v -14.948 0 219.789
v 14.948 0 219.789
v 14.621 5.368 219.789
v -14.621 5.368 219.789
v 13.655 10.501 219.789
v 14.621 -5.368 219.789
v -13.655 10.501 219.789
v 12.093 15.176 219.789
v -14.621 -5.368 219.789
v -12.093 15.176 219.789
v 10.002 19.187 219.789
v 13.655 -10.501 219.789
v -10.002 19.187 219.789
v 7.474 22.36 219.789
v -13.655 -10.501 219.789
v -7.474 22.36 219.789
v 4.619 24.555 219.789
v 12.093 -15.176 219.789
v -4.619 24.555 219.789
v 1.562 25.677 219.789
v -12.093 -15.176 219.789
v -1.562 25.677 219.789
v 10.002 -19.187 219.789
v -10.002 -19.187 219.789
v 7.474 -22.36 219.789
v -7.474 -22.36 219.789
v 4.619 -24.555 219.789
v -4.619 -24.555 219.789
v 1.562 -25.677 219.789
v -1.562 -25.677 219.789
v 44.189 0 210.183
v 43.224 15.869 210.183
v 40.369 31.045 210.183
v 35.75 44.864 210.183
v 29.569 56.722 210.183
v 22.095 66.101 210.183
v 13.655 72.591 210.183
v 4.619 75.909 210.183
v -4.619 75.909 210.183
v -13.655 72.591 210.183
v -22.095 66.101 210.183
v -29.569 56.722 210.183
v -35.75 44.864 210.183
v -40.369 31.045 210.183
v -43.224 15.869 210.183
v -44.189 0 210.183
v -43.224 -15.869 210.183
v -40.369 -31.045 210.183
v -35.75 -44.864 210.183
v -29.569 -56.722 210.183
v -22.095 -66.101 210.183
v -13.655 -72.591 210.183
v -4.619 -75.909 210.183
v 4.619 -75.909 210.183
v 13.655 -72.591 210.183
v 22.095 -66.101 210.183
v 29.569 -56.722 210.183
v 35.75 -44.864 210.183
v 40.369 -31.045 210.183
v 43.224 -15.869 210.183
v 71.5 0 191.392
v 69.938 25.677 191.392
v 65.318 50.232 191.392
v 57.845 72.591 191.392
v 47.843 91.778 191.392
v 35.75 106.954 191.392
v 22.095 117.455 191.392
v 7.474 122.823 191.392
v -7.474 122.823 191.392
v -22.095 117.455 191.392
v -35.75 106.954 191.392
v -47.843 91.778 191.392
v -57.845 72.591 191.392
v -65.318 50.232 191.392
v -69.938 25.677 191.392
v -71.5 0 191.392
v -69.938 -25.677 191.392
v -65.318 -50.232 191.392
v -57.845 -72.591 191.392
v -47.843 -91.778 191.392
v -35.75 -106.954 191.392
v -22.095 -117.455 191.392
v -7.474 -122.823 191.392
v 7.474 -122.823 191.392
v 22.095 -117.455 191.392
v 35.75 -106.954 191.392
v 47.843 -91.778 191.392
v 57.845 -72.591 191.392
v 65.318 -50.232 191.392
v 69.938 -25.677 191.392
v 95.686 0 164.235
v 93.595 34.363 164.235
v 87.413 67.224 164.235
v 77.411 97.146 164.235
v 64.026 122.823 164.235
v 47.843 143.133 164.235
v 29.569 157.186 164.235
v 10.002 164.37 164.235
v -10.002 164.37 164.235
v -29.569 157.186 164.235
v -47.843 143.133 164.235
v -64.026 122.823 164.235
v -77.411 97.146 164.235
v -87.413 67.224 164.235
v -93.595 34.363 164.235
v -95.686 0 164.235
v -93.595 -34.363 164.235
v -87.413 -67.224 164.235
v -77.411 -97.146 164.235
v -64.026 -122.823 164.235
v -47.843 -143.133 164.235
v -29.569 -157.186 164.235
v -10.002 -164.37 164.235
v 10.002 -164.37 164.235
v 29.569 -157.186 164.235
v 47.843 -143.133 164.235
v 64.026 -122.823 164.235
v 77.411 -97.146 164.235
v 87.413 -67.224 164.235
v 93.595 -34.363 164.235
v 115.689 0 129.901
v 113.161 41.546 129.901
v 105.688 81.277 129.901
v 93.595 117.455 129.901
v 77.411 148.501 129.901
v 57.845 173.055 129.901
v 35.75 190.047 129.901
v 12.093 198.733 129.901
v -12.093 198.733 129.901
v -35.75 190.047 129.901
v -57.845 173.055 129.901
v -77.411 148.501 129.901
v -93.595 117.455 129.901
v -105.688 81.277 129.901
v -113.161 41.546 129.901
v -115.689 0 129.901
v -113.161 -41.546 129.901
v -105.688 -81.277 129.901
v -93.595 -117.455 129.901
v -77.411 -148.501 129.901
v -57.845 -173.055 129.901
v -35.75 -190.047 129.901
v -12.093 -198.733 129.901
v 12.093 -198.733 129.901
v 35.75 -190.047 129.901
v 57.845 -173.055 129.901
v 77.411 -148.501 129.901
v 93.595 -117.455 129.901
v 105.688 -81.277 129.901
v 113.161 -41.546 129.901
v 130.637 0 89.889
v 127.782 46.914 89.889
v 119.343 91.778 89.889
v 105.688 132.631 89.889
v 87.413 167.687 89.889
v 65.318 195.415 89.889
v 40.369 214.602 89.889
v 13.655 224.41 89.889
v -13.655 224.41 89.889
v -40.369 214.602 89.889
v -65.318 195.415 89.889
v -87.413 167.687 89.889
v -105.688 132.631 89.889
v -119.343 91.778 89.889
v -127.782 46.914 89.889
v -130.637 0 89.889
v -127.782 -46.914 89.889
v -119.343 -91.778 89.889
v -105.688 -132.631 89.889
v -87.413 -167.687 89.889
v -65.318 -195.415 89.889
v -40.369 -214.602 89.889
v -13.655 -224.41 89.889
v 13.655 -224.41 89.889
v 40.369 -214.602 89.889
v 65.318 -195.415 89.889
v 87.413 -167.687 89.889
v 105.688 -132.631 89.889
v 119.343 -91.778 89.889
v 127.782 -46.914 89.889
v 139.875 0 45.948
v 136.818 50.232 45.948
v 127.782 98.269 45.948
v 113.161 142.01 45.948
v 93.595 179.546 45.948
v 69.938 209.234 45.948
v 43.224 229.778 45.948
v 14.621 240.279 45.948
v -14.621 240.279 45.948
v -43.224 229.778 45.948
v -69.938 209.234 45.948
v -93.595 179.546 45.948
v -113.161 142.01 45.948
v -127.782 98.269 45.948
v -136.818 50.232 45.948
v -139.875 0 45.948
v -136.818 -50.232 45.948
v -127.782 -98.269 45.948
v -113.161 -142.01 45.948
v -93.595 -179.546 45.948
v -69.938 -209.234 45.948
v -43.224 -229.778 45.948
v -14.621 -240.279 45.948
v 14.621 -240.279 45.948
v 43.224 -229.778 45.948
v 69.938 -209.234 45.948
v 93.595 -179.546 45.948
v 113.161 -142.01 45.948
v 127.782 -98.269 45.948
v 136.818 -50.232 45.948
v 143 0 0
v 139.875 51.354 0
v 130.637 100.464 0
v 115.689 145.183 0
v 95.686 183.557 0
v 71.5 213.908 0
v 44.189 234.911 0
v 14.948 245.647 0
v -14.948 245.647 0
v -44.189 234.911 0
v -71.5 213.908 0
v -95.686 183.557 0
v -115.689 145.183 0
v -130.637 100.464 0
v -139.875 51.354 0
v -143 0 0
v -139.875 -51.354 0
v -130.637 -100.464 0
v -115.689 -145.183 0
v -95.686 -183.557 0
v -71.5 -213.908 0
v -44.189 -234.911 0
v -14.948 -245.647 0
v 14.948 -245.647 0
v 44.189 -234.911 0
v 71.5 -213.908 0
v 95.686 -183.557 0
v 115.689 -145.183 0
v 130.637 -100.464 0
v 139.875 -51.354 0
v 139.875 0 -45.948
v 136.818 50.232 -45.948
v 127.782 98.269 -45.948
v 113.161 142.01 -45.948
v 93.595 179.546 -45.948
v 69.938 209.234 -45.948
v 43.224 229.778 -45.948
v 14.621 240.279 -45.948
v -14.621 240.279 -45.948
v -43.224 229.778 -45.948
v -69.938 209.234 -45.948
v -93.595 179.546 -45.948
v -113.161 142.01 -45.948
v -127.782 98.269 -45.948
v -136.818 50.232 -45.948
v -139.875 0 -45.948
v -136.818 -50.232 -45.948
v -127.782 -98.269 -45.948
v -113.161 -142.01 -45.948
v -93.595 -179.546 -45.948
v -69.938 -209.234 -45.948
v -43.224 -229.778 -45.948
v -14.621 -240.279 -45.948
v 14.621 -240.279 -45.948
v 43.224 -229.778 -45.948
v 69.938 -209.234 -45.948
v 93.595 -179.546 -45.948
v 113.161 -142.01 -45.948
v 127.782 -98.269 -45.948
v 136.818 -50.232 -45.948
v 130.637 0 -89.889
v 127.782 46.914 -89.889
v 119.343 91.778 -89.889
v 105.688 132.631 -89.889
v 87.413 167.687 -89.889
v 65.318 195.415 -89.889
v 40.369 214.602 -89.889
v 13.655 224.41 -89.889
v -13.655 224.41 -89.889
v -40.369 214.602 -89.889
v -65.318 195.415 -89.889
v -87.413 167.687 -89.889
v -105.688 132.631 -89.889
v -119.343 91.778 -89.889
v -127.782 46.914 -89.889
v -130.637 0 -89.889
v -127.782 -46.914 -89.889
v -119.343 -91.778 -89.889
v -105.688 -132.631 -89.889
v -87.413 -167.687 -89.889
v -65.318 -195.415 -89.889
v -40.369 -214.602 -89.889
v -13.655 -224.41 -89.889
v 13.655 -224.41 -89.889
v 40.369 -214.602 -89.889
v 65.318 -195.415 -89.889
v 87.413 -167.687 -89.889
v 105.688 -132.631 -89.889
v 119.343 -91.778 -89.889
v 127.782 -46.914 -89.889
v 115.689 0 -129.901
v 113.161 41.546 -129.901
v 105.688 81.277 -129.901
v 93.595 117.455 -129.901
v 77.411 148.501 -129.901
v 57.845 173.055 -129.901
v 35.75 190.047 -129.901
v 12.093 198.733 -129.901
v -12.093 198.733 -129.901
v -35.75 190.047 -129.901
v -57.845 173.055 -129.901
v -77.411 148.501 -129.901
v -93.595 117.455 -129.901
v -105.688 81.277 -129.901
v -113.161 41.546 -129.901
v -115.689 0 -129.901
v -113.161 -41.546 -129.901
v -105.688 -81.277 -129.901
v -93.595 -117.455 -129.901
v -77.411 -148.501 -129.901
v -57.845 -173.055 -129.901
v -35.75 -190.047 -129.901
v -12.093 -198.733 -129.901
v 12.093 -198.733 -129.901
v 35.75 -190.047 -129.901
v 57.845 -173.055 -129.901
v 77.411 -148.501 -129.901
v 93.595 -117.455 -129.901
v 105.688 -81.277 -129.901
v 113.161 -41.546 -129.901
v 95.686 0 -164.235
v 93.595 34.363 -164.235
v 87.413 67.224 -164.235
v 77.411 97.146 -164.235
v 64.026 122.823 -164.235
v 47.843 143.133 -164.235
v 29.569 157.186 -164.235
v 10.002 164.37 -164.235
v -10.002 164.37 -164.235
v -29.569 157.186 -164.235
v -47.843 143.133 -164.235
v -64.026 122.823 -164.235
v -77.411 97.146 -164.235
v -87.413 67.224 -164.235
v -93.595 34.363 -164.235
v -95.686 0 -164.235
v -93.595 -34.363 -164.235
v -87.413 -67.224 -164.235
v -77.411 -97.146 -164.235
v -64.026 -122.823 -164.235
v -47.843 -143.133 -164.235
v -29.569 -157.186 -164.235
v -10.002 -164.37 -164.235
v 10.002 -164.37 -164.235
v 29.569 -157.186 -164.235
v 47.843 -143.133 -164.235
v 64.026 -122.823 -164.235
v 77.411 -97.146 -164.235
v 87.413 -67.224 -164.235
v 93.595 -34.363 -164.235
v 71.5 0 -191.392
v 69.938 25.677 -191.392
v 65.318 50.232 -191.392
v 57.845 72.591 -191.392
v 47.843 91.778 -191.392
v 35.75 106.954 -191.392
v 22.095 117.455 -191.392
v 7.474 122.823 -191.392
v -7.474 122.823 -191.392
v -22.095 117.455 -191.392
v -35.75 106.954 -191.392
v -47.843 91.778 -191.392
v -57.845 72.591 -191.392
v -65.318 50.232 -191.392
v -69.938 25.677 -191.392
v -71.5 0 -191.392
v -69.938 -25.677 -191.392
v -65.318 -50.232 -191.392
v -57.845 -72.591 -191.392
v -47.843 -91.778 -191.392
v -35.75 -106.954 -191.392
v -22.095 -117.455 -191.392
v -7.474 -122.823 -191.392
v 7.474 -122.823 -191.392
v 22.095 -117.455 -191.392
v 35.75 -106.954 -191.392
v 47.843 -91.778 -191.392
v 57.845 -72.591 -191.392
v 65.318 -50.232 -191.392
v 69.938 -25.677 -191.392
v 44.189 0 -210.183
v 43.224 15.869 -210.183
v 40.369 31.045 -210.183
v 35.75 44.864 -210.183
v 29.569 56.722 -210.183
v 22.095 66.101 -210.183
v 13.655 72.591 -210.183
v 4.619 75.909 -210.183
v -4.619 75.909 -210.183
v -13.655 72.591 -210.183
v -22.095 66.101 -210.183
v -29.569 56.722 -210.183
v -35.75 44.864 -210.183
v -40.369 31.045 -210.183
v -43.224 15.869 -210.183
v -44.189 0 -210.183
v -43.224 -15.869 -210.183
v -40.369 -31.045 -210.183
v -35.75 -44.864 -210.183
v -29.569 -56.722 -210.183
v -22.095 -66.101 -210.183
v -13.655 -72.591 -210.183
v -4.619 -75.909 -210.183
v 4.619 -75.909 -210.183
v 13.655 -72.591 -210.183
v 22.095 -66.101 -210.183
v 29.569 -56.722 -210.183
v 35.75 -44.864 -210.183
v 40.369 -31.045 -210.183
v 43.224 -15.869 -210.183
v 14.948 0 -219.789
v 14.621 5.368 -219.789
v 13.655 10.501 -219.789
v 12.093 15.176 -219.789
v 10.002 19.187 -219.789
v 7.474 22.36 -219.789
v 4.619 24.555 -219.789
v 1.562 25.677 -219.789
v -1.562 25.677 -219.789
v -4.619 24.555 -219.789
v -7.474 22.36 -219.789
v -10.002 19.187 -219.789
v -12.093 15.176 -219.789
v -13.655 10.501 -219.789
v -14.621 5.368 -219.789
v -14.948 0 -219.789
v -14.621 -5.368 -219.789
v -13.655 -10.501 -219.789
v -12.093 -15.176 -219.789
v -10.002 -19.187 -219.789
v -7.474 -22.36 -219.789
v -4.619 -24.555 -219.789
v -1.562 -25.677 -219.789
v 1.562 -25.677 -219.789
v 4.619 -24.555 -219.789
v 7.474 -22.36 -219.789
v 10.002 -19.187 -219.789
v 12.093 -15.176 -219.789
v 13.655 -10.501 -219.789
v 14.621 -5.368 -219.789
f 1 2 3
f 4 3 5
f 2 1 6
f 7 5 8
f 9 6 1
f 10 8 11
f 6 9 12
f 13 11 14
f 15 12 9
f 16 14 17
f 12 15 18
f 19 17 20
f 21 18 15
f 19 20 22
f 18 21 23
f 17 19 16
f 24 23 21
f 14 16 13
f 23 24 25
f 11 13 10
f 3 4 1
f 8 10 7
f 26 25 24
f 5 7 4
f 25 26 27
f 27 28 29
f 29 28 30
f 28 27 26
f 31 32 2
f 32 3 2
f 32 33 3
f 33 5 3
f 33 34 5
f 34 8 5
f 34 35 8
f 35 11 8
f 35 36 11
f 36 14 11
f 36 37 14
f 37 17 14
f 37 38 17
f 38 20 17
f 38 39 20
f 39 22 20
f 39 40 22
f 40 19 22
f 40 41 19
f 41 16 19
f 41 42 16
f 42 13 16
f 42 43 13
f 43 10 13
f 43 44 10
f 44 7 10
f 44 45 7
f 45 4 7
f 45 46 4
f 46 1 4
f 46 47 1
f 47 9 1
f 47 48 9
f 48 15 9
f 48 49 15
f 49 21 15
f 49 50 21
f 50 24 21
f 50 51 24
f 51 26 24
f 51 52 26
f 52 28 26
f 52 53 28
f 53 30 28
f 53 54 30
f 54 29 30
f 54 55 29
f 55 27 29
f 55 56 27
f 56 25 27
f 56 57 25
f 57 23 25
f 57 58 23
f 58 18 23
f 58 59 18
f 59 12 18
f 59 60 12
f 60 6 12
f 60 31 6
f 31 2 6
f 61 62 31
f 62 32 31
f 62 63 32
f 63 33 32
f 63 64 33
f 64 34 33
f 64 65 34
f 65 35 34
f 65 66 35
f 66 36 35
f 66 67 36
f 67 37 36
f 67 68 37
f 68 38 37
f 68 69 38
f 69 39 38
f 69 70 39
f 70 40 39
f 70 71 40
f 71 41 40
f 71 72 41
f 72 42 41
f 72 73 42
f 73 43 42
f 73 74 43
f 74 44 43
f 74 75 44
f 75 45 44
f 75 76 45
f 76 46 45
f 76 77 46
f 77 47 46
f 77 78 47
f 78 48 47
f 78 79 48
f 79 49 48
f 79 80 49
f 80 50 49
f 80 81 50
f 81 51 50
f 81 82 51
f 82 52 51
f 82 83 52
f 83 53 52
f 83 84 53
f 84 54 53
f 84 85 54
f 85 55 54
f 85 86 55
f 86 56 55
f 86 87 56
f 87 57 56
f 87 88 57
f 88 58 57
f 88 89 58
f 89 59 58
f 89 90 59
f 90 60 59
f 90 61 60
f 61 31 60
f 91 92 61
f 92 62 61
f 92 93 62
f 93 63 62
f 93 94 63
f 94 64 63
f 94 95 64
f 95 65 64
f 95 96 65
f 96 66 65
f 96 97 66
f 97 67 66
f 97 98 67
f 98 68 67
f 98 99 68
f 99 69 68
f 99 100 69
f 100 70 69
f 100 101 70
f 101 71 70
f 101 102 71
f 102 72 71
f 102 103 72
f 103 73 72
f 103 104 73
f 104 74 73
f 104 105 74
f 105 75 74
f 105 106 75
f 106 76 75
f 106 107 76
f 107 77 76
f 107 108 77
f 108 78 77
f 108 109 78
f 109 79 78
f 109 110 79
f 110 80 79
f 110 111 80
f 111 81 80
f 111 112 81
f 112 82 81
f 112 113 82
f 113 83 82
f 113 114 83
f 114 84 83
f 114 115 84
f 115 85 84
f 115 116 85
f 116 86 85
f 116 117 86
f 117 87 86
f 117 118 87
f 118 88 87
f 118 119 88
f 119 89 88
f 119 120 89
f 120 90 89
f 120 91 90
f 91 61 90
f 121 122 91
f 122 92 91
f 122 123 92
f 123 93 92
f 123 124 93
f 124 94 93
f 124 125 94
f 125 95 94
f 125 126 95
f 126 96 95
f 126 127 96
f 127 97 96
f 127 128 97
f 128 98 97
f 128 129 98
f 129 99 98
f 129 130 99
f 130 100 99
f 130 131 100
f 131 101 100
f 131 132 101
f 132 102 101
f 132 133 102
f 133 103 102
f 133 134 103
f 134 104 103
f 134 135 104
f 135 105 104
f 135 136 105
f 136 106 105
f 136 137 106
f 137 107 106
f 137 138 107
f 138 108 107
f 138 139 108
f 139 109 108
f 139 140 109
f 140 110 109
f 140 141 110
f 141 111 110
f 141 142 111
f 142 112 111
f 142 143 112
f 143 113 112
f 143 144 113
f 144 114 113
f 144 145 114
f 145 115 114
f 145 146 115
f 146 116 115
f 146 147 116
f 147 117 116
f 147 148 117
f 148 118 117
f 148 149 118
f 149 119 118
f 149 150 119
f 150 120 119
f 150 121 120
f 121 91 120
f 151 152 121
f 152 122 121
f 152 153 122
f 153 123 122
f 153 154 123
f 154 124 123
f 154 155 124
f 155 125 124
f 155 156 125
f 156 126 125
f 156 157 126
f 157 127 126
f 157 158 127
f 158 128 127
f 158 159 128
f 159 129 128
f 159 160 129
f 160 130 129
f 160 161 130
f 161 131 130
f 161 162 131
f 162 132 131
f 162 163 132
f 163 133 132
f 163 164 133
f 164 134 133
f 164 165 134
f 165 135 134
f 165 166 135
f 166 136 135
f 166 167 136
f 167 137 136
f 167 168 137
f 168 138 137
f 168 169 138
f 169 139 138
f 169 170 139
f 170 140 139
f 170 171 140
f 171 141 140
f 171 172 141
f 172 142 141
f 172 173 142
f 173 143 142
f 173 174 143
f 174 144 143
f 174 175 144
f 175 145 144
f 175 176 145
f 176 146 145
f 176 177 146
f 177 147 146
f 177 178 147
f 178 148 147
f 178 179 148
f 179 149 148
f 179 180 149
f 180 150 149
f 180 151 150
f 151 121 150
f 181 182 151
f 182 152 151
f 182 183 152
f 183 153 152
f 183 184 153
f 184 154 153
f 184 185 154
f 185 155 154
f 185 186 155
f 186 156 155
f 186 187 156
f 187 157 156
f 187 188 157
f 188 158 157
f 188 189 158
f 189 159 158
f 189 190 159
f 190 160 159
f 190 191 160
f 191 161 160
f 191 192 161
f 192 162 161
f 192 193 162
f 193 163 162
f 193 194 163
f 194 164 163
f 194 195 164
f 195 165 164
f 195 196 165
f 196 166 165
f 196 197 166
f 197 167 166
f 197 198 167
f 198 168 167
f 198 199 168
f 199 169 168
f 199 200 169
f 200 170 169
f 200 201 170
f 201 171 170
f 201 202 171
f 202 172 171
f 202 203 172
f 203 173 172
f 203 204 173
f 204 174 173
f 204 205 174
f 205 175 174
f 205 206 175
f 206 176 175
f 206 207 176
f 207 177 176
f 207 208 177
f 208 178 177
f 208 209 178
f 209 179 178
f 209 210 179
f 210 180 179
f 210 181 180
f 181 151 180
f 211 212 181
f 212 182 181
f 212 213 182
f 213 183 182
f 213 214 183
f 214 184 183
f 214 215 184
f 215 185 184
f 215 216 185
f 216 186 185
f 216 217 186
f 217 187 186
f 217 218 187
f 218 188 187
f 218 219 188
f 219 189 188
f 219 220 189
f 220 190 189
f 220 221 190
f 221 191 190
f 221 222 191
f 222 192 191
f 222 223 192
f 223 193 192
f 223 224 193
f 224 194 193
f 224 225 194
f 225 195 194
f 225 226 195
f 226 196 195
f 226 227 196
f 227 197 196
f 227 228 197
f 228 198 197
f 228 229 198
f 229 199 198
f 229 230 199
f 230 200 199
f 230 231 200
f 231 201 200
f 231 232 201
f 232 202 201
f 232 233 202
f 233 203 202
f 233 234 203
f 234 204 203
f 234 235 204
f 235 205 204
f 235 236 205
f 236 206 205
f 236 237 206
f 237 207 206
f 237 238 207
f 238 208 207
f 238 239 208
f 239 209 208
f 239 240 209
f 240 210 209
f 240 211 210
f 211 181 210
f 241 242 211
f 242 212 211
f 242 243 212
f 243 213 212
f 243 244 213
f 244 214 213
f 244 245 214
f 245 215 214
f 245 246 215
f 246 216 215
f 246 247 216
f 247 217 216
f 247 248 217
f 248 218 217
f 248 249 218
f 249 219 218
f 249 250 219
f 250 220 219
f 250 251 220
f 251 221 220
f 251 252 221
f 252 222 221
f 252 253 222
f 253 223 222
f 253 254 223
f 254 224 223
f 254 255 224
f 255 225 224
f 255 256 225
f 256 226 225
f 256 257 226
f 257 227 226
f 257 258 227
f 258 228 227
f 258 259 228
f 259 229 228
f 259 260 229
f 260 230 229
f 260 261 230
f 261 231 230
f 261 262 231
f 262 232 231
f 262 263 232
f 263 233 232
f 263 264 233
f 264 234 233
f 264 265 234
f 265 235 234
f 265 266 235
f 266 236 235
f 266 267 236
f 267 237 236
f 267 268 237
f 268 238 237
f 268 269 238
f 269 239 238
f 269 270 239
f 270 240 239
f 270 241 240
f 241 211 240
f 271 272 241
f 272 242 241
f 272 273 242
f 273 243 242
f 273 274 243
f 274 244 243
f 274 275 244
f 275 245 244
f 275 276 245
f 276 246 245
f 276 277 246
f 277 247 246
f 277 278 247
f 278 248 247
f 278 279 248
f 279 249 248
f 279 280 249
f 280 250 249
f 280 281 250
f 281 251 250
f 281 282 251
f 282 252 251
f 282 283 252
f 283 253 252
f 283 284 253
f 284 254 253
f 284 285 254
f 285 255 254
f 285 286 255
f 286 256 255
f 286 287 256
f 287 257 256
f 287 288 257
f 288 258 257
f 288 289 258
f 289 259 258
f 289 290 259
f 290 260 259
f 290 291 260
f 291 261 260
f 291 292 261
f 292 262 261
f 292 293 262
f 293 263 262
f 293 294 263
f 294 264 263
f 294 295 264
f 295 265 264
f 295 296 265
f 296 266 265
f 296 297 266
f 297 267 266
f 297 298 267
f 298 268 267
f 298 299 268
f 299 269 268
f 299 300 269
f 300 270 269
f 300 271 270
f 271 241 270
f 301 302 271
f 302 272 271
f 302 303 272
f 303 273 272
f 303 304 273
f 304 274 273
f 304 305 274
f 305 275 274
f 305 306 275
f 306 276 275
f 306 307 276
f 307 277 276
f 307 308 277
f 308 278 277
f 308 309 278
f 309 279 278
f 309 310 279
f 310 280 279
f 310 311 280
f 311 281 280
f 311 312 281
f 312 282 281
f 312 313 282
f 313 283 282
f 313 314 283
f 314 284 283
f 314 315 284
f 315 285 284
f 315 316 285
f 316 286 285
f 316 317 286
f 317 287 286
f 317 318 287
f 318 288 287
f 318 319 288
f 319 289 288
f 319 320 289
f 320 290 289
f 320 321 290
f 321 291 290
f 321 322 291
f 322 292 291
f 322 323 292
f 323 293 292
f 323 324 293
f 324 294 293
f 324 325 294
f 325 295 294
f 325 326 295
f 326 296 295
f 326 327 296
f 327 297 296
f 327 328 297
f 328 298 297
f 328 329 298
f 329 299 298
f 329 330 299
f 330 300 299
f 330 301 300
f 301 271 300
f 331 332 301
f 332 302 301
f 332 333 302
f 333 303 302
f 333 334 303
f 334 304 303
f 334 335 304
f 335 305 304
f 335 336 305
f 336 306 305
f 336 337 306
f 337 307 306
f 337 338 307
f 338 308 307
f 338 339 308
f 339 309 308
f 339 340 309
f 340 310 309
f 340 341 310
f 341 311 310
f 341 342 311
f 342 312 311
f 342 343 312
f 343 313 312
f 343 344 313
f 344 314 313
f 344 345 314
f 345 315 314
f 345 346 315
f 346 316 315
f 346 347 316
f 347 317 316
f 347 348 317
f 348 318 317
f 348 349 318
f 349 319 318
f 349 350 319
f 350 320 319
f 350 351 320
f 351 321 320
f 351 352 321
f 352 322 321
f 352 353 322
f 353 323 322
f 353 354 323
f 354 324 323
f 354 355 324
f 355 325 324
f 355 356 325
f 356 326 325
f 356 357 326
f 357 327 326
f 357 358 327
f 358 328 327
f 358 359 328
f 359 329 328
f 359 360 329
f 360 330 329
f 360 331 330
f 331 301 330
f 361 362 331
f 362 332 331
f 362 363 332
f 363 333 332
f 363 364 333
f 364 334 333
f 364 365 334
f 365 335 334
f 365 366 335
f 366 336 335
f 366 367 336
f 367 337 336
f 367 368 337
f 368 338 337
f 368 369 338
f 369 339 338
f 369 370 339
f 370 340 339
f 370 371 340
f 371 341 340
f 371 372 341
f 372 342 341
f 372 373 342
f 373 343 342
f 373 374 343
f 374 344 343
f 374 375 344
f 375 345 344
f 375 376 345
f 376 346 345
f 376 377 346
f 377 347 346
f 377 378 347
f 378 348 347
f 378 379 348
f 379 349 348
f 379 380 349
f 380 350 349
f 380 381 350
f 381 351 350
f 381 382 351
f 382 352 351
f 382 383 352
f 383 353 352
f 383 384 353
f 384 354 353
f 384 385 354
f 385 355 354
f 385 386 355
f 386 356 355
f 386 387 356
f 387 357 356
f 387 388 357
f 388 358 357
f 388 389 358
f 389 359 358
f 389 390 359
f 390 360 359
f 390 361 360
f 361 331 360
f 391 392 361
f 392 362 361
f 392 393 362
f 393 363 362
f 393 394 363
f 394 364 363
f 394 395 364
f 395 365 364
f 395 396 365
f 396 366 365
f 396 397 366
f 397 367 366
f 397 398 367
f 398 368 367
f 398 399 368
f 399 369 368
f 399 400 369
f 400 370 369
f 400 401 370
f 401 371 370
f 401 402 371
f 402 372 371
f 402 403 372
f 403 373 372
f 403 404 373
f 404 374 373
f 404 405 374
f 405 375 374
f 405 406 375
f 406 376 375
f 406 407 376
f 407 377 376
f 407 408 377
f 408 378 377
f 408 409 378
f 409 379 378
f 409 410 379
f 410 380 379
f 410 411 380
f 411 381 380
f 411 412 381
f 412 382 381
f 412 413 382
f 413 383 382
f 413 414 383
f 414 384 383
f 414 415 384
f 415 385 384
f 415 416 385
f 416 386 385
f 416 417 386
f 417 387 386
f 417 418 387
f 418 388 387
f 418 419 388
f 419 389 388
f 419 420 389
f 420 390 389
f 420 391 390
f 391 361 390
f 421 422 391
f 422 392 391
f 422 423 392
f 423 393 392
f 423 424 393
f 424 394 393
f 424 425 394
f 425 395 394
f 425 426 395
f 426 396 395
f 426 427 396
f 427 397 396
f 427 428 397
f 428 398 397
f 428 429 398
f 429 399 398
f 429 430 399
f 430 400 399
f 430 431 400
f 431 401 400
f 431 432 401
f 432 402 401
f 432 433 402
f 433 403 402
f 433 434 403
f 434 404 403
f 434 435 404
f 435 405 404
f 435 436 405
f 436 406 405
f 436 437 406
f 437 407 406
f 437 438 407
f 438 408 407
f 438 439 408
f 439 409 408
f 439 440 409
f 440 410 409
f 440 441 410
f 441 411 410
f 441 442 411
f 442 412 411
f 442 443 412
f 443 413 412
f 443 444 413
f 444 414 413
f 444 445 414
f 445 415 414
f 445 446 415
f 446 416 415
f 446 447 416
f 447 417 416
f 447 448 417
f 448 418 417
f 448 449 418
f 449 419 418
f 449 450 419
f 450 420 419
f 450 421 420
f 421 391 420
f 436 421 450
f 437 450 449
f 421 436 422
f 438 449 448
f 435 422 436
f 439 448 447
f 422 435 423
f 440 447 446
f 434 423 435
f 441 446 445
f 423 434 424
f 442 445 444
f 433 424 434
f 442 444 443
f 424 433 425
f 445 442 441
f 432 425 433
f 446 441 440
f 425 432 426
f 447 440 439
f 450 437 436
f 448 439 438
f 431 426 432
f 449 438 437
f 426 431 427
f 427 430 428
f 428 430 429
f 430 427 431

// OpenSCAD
// Generated by SolidPython 1.0.1 on 2020-07-29 00:46:50


scale(v = [11, 19, 17]) {
	sphere(r = 13);
}
/***********************************************
*********      SolidPython code:      **********
************************************************
 
# import packages: SolidPython
from solid import *
from solid.utils import *
from itertools import chain, combinations, permutations


class Resize:

    def __init__(self, scad_file):
        self.scad_file = scad_file
        #self.scad_file = import_scad(scad_file)
        # cone/cylinder param:
        self.r1 = 0
        self.r2 = 0
        self.h = 0
        # rectangular prism param:
        self.w = 0
        self.l = 0
        # ellipse param:
        self.r = 0

    # import OpenScad code (file name corresponds to shape)


    # classify shape + parameters
    def assign(self, param1, param2, param3):
        if self.scad_file == 'cone.scad':
            self.r1 = param1
            self.r2 = param2
            self.h = param3
        elif self.scad_file == 'cylinder.scad':
            self.r1 = param1
            self.r2 = param2
            self.h = param3
        elif self.scad_file == 'rectangularPrism.scad':
            self.h = param1
            self.l = param2
            self.w = param3
        else:
            self.r = param1
            self.h = param2

    # resize parameters
    def iterate(self):
        x = range(3, 20, 2)
        i = 1
        if self.scad_file == 'cone.scad':
            tempList = list(permutations(x, 2))
            for temp in tempList:
                param1 = temp[0]
                param2 = temp[1]
                filepath = 'produced_scad_files/' + 'cone' + str(param1) + '_' + str(param2) + '_' + '.scad'
                scad_render_to_file(cylinder(h=param1, r1=param2, r2=0), filepath)

        elif self.scad_file == 'cylinder.scad':
            tempList = list(permutations(x, 3))
            for temp in tempList:
                param1 = temp[0]
                param2 = temp[1]
                filepath = 'produced_scad_files/' + 'cylinder' + str(param1) + '_' + str(param2) + '_' + '.scad'
                scad_render_to_file(cylinder(h=param1, r1=param2, r2=param2), filepath)

        elif self.scad_file == 'rectangularPrism.scad':
            tempList = list(permutations(x, 3))
            for temp in tempList:
                param1 = temp[0]
                param2 = temp[1]
                param3 = temp[2]
                filepath = 'produced_scad_files/' + 'rectangularPrism' + str(param1) + '_' + str(param2) + '_' + str(
                    param3) + '.scad'
                scad_render_to_file(cube(size=(param1, param2, param3)), filepath)

        elif self.scad_file == 'ellipse.scad':
            tempList = list(permutations(x, 4))
            for temp in tempList:
                param1 = temp[0]
                param2 = temp[1]
                param3 = temp[2]
                param4 = temp[3]
                filepath = 'produced_scad_files/' + 'ellipse' + str(param1) + '_' + str(param2) + '_' + str(param3) + '_' + str(param4) + '.scad'
                scad_render_to_file(scale([param1, param2, param3])(sphere(r=param4)), filepath)

    def render_to_scadfile(self):
        scad_render_to_file(scad, 'example.scad') 
 
************************************************/
